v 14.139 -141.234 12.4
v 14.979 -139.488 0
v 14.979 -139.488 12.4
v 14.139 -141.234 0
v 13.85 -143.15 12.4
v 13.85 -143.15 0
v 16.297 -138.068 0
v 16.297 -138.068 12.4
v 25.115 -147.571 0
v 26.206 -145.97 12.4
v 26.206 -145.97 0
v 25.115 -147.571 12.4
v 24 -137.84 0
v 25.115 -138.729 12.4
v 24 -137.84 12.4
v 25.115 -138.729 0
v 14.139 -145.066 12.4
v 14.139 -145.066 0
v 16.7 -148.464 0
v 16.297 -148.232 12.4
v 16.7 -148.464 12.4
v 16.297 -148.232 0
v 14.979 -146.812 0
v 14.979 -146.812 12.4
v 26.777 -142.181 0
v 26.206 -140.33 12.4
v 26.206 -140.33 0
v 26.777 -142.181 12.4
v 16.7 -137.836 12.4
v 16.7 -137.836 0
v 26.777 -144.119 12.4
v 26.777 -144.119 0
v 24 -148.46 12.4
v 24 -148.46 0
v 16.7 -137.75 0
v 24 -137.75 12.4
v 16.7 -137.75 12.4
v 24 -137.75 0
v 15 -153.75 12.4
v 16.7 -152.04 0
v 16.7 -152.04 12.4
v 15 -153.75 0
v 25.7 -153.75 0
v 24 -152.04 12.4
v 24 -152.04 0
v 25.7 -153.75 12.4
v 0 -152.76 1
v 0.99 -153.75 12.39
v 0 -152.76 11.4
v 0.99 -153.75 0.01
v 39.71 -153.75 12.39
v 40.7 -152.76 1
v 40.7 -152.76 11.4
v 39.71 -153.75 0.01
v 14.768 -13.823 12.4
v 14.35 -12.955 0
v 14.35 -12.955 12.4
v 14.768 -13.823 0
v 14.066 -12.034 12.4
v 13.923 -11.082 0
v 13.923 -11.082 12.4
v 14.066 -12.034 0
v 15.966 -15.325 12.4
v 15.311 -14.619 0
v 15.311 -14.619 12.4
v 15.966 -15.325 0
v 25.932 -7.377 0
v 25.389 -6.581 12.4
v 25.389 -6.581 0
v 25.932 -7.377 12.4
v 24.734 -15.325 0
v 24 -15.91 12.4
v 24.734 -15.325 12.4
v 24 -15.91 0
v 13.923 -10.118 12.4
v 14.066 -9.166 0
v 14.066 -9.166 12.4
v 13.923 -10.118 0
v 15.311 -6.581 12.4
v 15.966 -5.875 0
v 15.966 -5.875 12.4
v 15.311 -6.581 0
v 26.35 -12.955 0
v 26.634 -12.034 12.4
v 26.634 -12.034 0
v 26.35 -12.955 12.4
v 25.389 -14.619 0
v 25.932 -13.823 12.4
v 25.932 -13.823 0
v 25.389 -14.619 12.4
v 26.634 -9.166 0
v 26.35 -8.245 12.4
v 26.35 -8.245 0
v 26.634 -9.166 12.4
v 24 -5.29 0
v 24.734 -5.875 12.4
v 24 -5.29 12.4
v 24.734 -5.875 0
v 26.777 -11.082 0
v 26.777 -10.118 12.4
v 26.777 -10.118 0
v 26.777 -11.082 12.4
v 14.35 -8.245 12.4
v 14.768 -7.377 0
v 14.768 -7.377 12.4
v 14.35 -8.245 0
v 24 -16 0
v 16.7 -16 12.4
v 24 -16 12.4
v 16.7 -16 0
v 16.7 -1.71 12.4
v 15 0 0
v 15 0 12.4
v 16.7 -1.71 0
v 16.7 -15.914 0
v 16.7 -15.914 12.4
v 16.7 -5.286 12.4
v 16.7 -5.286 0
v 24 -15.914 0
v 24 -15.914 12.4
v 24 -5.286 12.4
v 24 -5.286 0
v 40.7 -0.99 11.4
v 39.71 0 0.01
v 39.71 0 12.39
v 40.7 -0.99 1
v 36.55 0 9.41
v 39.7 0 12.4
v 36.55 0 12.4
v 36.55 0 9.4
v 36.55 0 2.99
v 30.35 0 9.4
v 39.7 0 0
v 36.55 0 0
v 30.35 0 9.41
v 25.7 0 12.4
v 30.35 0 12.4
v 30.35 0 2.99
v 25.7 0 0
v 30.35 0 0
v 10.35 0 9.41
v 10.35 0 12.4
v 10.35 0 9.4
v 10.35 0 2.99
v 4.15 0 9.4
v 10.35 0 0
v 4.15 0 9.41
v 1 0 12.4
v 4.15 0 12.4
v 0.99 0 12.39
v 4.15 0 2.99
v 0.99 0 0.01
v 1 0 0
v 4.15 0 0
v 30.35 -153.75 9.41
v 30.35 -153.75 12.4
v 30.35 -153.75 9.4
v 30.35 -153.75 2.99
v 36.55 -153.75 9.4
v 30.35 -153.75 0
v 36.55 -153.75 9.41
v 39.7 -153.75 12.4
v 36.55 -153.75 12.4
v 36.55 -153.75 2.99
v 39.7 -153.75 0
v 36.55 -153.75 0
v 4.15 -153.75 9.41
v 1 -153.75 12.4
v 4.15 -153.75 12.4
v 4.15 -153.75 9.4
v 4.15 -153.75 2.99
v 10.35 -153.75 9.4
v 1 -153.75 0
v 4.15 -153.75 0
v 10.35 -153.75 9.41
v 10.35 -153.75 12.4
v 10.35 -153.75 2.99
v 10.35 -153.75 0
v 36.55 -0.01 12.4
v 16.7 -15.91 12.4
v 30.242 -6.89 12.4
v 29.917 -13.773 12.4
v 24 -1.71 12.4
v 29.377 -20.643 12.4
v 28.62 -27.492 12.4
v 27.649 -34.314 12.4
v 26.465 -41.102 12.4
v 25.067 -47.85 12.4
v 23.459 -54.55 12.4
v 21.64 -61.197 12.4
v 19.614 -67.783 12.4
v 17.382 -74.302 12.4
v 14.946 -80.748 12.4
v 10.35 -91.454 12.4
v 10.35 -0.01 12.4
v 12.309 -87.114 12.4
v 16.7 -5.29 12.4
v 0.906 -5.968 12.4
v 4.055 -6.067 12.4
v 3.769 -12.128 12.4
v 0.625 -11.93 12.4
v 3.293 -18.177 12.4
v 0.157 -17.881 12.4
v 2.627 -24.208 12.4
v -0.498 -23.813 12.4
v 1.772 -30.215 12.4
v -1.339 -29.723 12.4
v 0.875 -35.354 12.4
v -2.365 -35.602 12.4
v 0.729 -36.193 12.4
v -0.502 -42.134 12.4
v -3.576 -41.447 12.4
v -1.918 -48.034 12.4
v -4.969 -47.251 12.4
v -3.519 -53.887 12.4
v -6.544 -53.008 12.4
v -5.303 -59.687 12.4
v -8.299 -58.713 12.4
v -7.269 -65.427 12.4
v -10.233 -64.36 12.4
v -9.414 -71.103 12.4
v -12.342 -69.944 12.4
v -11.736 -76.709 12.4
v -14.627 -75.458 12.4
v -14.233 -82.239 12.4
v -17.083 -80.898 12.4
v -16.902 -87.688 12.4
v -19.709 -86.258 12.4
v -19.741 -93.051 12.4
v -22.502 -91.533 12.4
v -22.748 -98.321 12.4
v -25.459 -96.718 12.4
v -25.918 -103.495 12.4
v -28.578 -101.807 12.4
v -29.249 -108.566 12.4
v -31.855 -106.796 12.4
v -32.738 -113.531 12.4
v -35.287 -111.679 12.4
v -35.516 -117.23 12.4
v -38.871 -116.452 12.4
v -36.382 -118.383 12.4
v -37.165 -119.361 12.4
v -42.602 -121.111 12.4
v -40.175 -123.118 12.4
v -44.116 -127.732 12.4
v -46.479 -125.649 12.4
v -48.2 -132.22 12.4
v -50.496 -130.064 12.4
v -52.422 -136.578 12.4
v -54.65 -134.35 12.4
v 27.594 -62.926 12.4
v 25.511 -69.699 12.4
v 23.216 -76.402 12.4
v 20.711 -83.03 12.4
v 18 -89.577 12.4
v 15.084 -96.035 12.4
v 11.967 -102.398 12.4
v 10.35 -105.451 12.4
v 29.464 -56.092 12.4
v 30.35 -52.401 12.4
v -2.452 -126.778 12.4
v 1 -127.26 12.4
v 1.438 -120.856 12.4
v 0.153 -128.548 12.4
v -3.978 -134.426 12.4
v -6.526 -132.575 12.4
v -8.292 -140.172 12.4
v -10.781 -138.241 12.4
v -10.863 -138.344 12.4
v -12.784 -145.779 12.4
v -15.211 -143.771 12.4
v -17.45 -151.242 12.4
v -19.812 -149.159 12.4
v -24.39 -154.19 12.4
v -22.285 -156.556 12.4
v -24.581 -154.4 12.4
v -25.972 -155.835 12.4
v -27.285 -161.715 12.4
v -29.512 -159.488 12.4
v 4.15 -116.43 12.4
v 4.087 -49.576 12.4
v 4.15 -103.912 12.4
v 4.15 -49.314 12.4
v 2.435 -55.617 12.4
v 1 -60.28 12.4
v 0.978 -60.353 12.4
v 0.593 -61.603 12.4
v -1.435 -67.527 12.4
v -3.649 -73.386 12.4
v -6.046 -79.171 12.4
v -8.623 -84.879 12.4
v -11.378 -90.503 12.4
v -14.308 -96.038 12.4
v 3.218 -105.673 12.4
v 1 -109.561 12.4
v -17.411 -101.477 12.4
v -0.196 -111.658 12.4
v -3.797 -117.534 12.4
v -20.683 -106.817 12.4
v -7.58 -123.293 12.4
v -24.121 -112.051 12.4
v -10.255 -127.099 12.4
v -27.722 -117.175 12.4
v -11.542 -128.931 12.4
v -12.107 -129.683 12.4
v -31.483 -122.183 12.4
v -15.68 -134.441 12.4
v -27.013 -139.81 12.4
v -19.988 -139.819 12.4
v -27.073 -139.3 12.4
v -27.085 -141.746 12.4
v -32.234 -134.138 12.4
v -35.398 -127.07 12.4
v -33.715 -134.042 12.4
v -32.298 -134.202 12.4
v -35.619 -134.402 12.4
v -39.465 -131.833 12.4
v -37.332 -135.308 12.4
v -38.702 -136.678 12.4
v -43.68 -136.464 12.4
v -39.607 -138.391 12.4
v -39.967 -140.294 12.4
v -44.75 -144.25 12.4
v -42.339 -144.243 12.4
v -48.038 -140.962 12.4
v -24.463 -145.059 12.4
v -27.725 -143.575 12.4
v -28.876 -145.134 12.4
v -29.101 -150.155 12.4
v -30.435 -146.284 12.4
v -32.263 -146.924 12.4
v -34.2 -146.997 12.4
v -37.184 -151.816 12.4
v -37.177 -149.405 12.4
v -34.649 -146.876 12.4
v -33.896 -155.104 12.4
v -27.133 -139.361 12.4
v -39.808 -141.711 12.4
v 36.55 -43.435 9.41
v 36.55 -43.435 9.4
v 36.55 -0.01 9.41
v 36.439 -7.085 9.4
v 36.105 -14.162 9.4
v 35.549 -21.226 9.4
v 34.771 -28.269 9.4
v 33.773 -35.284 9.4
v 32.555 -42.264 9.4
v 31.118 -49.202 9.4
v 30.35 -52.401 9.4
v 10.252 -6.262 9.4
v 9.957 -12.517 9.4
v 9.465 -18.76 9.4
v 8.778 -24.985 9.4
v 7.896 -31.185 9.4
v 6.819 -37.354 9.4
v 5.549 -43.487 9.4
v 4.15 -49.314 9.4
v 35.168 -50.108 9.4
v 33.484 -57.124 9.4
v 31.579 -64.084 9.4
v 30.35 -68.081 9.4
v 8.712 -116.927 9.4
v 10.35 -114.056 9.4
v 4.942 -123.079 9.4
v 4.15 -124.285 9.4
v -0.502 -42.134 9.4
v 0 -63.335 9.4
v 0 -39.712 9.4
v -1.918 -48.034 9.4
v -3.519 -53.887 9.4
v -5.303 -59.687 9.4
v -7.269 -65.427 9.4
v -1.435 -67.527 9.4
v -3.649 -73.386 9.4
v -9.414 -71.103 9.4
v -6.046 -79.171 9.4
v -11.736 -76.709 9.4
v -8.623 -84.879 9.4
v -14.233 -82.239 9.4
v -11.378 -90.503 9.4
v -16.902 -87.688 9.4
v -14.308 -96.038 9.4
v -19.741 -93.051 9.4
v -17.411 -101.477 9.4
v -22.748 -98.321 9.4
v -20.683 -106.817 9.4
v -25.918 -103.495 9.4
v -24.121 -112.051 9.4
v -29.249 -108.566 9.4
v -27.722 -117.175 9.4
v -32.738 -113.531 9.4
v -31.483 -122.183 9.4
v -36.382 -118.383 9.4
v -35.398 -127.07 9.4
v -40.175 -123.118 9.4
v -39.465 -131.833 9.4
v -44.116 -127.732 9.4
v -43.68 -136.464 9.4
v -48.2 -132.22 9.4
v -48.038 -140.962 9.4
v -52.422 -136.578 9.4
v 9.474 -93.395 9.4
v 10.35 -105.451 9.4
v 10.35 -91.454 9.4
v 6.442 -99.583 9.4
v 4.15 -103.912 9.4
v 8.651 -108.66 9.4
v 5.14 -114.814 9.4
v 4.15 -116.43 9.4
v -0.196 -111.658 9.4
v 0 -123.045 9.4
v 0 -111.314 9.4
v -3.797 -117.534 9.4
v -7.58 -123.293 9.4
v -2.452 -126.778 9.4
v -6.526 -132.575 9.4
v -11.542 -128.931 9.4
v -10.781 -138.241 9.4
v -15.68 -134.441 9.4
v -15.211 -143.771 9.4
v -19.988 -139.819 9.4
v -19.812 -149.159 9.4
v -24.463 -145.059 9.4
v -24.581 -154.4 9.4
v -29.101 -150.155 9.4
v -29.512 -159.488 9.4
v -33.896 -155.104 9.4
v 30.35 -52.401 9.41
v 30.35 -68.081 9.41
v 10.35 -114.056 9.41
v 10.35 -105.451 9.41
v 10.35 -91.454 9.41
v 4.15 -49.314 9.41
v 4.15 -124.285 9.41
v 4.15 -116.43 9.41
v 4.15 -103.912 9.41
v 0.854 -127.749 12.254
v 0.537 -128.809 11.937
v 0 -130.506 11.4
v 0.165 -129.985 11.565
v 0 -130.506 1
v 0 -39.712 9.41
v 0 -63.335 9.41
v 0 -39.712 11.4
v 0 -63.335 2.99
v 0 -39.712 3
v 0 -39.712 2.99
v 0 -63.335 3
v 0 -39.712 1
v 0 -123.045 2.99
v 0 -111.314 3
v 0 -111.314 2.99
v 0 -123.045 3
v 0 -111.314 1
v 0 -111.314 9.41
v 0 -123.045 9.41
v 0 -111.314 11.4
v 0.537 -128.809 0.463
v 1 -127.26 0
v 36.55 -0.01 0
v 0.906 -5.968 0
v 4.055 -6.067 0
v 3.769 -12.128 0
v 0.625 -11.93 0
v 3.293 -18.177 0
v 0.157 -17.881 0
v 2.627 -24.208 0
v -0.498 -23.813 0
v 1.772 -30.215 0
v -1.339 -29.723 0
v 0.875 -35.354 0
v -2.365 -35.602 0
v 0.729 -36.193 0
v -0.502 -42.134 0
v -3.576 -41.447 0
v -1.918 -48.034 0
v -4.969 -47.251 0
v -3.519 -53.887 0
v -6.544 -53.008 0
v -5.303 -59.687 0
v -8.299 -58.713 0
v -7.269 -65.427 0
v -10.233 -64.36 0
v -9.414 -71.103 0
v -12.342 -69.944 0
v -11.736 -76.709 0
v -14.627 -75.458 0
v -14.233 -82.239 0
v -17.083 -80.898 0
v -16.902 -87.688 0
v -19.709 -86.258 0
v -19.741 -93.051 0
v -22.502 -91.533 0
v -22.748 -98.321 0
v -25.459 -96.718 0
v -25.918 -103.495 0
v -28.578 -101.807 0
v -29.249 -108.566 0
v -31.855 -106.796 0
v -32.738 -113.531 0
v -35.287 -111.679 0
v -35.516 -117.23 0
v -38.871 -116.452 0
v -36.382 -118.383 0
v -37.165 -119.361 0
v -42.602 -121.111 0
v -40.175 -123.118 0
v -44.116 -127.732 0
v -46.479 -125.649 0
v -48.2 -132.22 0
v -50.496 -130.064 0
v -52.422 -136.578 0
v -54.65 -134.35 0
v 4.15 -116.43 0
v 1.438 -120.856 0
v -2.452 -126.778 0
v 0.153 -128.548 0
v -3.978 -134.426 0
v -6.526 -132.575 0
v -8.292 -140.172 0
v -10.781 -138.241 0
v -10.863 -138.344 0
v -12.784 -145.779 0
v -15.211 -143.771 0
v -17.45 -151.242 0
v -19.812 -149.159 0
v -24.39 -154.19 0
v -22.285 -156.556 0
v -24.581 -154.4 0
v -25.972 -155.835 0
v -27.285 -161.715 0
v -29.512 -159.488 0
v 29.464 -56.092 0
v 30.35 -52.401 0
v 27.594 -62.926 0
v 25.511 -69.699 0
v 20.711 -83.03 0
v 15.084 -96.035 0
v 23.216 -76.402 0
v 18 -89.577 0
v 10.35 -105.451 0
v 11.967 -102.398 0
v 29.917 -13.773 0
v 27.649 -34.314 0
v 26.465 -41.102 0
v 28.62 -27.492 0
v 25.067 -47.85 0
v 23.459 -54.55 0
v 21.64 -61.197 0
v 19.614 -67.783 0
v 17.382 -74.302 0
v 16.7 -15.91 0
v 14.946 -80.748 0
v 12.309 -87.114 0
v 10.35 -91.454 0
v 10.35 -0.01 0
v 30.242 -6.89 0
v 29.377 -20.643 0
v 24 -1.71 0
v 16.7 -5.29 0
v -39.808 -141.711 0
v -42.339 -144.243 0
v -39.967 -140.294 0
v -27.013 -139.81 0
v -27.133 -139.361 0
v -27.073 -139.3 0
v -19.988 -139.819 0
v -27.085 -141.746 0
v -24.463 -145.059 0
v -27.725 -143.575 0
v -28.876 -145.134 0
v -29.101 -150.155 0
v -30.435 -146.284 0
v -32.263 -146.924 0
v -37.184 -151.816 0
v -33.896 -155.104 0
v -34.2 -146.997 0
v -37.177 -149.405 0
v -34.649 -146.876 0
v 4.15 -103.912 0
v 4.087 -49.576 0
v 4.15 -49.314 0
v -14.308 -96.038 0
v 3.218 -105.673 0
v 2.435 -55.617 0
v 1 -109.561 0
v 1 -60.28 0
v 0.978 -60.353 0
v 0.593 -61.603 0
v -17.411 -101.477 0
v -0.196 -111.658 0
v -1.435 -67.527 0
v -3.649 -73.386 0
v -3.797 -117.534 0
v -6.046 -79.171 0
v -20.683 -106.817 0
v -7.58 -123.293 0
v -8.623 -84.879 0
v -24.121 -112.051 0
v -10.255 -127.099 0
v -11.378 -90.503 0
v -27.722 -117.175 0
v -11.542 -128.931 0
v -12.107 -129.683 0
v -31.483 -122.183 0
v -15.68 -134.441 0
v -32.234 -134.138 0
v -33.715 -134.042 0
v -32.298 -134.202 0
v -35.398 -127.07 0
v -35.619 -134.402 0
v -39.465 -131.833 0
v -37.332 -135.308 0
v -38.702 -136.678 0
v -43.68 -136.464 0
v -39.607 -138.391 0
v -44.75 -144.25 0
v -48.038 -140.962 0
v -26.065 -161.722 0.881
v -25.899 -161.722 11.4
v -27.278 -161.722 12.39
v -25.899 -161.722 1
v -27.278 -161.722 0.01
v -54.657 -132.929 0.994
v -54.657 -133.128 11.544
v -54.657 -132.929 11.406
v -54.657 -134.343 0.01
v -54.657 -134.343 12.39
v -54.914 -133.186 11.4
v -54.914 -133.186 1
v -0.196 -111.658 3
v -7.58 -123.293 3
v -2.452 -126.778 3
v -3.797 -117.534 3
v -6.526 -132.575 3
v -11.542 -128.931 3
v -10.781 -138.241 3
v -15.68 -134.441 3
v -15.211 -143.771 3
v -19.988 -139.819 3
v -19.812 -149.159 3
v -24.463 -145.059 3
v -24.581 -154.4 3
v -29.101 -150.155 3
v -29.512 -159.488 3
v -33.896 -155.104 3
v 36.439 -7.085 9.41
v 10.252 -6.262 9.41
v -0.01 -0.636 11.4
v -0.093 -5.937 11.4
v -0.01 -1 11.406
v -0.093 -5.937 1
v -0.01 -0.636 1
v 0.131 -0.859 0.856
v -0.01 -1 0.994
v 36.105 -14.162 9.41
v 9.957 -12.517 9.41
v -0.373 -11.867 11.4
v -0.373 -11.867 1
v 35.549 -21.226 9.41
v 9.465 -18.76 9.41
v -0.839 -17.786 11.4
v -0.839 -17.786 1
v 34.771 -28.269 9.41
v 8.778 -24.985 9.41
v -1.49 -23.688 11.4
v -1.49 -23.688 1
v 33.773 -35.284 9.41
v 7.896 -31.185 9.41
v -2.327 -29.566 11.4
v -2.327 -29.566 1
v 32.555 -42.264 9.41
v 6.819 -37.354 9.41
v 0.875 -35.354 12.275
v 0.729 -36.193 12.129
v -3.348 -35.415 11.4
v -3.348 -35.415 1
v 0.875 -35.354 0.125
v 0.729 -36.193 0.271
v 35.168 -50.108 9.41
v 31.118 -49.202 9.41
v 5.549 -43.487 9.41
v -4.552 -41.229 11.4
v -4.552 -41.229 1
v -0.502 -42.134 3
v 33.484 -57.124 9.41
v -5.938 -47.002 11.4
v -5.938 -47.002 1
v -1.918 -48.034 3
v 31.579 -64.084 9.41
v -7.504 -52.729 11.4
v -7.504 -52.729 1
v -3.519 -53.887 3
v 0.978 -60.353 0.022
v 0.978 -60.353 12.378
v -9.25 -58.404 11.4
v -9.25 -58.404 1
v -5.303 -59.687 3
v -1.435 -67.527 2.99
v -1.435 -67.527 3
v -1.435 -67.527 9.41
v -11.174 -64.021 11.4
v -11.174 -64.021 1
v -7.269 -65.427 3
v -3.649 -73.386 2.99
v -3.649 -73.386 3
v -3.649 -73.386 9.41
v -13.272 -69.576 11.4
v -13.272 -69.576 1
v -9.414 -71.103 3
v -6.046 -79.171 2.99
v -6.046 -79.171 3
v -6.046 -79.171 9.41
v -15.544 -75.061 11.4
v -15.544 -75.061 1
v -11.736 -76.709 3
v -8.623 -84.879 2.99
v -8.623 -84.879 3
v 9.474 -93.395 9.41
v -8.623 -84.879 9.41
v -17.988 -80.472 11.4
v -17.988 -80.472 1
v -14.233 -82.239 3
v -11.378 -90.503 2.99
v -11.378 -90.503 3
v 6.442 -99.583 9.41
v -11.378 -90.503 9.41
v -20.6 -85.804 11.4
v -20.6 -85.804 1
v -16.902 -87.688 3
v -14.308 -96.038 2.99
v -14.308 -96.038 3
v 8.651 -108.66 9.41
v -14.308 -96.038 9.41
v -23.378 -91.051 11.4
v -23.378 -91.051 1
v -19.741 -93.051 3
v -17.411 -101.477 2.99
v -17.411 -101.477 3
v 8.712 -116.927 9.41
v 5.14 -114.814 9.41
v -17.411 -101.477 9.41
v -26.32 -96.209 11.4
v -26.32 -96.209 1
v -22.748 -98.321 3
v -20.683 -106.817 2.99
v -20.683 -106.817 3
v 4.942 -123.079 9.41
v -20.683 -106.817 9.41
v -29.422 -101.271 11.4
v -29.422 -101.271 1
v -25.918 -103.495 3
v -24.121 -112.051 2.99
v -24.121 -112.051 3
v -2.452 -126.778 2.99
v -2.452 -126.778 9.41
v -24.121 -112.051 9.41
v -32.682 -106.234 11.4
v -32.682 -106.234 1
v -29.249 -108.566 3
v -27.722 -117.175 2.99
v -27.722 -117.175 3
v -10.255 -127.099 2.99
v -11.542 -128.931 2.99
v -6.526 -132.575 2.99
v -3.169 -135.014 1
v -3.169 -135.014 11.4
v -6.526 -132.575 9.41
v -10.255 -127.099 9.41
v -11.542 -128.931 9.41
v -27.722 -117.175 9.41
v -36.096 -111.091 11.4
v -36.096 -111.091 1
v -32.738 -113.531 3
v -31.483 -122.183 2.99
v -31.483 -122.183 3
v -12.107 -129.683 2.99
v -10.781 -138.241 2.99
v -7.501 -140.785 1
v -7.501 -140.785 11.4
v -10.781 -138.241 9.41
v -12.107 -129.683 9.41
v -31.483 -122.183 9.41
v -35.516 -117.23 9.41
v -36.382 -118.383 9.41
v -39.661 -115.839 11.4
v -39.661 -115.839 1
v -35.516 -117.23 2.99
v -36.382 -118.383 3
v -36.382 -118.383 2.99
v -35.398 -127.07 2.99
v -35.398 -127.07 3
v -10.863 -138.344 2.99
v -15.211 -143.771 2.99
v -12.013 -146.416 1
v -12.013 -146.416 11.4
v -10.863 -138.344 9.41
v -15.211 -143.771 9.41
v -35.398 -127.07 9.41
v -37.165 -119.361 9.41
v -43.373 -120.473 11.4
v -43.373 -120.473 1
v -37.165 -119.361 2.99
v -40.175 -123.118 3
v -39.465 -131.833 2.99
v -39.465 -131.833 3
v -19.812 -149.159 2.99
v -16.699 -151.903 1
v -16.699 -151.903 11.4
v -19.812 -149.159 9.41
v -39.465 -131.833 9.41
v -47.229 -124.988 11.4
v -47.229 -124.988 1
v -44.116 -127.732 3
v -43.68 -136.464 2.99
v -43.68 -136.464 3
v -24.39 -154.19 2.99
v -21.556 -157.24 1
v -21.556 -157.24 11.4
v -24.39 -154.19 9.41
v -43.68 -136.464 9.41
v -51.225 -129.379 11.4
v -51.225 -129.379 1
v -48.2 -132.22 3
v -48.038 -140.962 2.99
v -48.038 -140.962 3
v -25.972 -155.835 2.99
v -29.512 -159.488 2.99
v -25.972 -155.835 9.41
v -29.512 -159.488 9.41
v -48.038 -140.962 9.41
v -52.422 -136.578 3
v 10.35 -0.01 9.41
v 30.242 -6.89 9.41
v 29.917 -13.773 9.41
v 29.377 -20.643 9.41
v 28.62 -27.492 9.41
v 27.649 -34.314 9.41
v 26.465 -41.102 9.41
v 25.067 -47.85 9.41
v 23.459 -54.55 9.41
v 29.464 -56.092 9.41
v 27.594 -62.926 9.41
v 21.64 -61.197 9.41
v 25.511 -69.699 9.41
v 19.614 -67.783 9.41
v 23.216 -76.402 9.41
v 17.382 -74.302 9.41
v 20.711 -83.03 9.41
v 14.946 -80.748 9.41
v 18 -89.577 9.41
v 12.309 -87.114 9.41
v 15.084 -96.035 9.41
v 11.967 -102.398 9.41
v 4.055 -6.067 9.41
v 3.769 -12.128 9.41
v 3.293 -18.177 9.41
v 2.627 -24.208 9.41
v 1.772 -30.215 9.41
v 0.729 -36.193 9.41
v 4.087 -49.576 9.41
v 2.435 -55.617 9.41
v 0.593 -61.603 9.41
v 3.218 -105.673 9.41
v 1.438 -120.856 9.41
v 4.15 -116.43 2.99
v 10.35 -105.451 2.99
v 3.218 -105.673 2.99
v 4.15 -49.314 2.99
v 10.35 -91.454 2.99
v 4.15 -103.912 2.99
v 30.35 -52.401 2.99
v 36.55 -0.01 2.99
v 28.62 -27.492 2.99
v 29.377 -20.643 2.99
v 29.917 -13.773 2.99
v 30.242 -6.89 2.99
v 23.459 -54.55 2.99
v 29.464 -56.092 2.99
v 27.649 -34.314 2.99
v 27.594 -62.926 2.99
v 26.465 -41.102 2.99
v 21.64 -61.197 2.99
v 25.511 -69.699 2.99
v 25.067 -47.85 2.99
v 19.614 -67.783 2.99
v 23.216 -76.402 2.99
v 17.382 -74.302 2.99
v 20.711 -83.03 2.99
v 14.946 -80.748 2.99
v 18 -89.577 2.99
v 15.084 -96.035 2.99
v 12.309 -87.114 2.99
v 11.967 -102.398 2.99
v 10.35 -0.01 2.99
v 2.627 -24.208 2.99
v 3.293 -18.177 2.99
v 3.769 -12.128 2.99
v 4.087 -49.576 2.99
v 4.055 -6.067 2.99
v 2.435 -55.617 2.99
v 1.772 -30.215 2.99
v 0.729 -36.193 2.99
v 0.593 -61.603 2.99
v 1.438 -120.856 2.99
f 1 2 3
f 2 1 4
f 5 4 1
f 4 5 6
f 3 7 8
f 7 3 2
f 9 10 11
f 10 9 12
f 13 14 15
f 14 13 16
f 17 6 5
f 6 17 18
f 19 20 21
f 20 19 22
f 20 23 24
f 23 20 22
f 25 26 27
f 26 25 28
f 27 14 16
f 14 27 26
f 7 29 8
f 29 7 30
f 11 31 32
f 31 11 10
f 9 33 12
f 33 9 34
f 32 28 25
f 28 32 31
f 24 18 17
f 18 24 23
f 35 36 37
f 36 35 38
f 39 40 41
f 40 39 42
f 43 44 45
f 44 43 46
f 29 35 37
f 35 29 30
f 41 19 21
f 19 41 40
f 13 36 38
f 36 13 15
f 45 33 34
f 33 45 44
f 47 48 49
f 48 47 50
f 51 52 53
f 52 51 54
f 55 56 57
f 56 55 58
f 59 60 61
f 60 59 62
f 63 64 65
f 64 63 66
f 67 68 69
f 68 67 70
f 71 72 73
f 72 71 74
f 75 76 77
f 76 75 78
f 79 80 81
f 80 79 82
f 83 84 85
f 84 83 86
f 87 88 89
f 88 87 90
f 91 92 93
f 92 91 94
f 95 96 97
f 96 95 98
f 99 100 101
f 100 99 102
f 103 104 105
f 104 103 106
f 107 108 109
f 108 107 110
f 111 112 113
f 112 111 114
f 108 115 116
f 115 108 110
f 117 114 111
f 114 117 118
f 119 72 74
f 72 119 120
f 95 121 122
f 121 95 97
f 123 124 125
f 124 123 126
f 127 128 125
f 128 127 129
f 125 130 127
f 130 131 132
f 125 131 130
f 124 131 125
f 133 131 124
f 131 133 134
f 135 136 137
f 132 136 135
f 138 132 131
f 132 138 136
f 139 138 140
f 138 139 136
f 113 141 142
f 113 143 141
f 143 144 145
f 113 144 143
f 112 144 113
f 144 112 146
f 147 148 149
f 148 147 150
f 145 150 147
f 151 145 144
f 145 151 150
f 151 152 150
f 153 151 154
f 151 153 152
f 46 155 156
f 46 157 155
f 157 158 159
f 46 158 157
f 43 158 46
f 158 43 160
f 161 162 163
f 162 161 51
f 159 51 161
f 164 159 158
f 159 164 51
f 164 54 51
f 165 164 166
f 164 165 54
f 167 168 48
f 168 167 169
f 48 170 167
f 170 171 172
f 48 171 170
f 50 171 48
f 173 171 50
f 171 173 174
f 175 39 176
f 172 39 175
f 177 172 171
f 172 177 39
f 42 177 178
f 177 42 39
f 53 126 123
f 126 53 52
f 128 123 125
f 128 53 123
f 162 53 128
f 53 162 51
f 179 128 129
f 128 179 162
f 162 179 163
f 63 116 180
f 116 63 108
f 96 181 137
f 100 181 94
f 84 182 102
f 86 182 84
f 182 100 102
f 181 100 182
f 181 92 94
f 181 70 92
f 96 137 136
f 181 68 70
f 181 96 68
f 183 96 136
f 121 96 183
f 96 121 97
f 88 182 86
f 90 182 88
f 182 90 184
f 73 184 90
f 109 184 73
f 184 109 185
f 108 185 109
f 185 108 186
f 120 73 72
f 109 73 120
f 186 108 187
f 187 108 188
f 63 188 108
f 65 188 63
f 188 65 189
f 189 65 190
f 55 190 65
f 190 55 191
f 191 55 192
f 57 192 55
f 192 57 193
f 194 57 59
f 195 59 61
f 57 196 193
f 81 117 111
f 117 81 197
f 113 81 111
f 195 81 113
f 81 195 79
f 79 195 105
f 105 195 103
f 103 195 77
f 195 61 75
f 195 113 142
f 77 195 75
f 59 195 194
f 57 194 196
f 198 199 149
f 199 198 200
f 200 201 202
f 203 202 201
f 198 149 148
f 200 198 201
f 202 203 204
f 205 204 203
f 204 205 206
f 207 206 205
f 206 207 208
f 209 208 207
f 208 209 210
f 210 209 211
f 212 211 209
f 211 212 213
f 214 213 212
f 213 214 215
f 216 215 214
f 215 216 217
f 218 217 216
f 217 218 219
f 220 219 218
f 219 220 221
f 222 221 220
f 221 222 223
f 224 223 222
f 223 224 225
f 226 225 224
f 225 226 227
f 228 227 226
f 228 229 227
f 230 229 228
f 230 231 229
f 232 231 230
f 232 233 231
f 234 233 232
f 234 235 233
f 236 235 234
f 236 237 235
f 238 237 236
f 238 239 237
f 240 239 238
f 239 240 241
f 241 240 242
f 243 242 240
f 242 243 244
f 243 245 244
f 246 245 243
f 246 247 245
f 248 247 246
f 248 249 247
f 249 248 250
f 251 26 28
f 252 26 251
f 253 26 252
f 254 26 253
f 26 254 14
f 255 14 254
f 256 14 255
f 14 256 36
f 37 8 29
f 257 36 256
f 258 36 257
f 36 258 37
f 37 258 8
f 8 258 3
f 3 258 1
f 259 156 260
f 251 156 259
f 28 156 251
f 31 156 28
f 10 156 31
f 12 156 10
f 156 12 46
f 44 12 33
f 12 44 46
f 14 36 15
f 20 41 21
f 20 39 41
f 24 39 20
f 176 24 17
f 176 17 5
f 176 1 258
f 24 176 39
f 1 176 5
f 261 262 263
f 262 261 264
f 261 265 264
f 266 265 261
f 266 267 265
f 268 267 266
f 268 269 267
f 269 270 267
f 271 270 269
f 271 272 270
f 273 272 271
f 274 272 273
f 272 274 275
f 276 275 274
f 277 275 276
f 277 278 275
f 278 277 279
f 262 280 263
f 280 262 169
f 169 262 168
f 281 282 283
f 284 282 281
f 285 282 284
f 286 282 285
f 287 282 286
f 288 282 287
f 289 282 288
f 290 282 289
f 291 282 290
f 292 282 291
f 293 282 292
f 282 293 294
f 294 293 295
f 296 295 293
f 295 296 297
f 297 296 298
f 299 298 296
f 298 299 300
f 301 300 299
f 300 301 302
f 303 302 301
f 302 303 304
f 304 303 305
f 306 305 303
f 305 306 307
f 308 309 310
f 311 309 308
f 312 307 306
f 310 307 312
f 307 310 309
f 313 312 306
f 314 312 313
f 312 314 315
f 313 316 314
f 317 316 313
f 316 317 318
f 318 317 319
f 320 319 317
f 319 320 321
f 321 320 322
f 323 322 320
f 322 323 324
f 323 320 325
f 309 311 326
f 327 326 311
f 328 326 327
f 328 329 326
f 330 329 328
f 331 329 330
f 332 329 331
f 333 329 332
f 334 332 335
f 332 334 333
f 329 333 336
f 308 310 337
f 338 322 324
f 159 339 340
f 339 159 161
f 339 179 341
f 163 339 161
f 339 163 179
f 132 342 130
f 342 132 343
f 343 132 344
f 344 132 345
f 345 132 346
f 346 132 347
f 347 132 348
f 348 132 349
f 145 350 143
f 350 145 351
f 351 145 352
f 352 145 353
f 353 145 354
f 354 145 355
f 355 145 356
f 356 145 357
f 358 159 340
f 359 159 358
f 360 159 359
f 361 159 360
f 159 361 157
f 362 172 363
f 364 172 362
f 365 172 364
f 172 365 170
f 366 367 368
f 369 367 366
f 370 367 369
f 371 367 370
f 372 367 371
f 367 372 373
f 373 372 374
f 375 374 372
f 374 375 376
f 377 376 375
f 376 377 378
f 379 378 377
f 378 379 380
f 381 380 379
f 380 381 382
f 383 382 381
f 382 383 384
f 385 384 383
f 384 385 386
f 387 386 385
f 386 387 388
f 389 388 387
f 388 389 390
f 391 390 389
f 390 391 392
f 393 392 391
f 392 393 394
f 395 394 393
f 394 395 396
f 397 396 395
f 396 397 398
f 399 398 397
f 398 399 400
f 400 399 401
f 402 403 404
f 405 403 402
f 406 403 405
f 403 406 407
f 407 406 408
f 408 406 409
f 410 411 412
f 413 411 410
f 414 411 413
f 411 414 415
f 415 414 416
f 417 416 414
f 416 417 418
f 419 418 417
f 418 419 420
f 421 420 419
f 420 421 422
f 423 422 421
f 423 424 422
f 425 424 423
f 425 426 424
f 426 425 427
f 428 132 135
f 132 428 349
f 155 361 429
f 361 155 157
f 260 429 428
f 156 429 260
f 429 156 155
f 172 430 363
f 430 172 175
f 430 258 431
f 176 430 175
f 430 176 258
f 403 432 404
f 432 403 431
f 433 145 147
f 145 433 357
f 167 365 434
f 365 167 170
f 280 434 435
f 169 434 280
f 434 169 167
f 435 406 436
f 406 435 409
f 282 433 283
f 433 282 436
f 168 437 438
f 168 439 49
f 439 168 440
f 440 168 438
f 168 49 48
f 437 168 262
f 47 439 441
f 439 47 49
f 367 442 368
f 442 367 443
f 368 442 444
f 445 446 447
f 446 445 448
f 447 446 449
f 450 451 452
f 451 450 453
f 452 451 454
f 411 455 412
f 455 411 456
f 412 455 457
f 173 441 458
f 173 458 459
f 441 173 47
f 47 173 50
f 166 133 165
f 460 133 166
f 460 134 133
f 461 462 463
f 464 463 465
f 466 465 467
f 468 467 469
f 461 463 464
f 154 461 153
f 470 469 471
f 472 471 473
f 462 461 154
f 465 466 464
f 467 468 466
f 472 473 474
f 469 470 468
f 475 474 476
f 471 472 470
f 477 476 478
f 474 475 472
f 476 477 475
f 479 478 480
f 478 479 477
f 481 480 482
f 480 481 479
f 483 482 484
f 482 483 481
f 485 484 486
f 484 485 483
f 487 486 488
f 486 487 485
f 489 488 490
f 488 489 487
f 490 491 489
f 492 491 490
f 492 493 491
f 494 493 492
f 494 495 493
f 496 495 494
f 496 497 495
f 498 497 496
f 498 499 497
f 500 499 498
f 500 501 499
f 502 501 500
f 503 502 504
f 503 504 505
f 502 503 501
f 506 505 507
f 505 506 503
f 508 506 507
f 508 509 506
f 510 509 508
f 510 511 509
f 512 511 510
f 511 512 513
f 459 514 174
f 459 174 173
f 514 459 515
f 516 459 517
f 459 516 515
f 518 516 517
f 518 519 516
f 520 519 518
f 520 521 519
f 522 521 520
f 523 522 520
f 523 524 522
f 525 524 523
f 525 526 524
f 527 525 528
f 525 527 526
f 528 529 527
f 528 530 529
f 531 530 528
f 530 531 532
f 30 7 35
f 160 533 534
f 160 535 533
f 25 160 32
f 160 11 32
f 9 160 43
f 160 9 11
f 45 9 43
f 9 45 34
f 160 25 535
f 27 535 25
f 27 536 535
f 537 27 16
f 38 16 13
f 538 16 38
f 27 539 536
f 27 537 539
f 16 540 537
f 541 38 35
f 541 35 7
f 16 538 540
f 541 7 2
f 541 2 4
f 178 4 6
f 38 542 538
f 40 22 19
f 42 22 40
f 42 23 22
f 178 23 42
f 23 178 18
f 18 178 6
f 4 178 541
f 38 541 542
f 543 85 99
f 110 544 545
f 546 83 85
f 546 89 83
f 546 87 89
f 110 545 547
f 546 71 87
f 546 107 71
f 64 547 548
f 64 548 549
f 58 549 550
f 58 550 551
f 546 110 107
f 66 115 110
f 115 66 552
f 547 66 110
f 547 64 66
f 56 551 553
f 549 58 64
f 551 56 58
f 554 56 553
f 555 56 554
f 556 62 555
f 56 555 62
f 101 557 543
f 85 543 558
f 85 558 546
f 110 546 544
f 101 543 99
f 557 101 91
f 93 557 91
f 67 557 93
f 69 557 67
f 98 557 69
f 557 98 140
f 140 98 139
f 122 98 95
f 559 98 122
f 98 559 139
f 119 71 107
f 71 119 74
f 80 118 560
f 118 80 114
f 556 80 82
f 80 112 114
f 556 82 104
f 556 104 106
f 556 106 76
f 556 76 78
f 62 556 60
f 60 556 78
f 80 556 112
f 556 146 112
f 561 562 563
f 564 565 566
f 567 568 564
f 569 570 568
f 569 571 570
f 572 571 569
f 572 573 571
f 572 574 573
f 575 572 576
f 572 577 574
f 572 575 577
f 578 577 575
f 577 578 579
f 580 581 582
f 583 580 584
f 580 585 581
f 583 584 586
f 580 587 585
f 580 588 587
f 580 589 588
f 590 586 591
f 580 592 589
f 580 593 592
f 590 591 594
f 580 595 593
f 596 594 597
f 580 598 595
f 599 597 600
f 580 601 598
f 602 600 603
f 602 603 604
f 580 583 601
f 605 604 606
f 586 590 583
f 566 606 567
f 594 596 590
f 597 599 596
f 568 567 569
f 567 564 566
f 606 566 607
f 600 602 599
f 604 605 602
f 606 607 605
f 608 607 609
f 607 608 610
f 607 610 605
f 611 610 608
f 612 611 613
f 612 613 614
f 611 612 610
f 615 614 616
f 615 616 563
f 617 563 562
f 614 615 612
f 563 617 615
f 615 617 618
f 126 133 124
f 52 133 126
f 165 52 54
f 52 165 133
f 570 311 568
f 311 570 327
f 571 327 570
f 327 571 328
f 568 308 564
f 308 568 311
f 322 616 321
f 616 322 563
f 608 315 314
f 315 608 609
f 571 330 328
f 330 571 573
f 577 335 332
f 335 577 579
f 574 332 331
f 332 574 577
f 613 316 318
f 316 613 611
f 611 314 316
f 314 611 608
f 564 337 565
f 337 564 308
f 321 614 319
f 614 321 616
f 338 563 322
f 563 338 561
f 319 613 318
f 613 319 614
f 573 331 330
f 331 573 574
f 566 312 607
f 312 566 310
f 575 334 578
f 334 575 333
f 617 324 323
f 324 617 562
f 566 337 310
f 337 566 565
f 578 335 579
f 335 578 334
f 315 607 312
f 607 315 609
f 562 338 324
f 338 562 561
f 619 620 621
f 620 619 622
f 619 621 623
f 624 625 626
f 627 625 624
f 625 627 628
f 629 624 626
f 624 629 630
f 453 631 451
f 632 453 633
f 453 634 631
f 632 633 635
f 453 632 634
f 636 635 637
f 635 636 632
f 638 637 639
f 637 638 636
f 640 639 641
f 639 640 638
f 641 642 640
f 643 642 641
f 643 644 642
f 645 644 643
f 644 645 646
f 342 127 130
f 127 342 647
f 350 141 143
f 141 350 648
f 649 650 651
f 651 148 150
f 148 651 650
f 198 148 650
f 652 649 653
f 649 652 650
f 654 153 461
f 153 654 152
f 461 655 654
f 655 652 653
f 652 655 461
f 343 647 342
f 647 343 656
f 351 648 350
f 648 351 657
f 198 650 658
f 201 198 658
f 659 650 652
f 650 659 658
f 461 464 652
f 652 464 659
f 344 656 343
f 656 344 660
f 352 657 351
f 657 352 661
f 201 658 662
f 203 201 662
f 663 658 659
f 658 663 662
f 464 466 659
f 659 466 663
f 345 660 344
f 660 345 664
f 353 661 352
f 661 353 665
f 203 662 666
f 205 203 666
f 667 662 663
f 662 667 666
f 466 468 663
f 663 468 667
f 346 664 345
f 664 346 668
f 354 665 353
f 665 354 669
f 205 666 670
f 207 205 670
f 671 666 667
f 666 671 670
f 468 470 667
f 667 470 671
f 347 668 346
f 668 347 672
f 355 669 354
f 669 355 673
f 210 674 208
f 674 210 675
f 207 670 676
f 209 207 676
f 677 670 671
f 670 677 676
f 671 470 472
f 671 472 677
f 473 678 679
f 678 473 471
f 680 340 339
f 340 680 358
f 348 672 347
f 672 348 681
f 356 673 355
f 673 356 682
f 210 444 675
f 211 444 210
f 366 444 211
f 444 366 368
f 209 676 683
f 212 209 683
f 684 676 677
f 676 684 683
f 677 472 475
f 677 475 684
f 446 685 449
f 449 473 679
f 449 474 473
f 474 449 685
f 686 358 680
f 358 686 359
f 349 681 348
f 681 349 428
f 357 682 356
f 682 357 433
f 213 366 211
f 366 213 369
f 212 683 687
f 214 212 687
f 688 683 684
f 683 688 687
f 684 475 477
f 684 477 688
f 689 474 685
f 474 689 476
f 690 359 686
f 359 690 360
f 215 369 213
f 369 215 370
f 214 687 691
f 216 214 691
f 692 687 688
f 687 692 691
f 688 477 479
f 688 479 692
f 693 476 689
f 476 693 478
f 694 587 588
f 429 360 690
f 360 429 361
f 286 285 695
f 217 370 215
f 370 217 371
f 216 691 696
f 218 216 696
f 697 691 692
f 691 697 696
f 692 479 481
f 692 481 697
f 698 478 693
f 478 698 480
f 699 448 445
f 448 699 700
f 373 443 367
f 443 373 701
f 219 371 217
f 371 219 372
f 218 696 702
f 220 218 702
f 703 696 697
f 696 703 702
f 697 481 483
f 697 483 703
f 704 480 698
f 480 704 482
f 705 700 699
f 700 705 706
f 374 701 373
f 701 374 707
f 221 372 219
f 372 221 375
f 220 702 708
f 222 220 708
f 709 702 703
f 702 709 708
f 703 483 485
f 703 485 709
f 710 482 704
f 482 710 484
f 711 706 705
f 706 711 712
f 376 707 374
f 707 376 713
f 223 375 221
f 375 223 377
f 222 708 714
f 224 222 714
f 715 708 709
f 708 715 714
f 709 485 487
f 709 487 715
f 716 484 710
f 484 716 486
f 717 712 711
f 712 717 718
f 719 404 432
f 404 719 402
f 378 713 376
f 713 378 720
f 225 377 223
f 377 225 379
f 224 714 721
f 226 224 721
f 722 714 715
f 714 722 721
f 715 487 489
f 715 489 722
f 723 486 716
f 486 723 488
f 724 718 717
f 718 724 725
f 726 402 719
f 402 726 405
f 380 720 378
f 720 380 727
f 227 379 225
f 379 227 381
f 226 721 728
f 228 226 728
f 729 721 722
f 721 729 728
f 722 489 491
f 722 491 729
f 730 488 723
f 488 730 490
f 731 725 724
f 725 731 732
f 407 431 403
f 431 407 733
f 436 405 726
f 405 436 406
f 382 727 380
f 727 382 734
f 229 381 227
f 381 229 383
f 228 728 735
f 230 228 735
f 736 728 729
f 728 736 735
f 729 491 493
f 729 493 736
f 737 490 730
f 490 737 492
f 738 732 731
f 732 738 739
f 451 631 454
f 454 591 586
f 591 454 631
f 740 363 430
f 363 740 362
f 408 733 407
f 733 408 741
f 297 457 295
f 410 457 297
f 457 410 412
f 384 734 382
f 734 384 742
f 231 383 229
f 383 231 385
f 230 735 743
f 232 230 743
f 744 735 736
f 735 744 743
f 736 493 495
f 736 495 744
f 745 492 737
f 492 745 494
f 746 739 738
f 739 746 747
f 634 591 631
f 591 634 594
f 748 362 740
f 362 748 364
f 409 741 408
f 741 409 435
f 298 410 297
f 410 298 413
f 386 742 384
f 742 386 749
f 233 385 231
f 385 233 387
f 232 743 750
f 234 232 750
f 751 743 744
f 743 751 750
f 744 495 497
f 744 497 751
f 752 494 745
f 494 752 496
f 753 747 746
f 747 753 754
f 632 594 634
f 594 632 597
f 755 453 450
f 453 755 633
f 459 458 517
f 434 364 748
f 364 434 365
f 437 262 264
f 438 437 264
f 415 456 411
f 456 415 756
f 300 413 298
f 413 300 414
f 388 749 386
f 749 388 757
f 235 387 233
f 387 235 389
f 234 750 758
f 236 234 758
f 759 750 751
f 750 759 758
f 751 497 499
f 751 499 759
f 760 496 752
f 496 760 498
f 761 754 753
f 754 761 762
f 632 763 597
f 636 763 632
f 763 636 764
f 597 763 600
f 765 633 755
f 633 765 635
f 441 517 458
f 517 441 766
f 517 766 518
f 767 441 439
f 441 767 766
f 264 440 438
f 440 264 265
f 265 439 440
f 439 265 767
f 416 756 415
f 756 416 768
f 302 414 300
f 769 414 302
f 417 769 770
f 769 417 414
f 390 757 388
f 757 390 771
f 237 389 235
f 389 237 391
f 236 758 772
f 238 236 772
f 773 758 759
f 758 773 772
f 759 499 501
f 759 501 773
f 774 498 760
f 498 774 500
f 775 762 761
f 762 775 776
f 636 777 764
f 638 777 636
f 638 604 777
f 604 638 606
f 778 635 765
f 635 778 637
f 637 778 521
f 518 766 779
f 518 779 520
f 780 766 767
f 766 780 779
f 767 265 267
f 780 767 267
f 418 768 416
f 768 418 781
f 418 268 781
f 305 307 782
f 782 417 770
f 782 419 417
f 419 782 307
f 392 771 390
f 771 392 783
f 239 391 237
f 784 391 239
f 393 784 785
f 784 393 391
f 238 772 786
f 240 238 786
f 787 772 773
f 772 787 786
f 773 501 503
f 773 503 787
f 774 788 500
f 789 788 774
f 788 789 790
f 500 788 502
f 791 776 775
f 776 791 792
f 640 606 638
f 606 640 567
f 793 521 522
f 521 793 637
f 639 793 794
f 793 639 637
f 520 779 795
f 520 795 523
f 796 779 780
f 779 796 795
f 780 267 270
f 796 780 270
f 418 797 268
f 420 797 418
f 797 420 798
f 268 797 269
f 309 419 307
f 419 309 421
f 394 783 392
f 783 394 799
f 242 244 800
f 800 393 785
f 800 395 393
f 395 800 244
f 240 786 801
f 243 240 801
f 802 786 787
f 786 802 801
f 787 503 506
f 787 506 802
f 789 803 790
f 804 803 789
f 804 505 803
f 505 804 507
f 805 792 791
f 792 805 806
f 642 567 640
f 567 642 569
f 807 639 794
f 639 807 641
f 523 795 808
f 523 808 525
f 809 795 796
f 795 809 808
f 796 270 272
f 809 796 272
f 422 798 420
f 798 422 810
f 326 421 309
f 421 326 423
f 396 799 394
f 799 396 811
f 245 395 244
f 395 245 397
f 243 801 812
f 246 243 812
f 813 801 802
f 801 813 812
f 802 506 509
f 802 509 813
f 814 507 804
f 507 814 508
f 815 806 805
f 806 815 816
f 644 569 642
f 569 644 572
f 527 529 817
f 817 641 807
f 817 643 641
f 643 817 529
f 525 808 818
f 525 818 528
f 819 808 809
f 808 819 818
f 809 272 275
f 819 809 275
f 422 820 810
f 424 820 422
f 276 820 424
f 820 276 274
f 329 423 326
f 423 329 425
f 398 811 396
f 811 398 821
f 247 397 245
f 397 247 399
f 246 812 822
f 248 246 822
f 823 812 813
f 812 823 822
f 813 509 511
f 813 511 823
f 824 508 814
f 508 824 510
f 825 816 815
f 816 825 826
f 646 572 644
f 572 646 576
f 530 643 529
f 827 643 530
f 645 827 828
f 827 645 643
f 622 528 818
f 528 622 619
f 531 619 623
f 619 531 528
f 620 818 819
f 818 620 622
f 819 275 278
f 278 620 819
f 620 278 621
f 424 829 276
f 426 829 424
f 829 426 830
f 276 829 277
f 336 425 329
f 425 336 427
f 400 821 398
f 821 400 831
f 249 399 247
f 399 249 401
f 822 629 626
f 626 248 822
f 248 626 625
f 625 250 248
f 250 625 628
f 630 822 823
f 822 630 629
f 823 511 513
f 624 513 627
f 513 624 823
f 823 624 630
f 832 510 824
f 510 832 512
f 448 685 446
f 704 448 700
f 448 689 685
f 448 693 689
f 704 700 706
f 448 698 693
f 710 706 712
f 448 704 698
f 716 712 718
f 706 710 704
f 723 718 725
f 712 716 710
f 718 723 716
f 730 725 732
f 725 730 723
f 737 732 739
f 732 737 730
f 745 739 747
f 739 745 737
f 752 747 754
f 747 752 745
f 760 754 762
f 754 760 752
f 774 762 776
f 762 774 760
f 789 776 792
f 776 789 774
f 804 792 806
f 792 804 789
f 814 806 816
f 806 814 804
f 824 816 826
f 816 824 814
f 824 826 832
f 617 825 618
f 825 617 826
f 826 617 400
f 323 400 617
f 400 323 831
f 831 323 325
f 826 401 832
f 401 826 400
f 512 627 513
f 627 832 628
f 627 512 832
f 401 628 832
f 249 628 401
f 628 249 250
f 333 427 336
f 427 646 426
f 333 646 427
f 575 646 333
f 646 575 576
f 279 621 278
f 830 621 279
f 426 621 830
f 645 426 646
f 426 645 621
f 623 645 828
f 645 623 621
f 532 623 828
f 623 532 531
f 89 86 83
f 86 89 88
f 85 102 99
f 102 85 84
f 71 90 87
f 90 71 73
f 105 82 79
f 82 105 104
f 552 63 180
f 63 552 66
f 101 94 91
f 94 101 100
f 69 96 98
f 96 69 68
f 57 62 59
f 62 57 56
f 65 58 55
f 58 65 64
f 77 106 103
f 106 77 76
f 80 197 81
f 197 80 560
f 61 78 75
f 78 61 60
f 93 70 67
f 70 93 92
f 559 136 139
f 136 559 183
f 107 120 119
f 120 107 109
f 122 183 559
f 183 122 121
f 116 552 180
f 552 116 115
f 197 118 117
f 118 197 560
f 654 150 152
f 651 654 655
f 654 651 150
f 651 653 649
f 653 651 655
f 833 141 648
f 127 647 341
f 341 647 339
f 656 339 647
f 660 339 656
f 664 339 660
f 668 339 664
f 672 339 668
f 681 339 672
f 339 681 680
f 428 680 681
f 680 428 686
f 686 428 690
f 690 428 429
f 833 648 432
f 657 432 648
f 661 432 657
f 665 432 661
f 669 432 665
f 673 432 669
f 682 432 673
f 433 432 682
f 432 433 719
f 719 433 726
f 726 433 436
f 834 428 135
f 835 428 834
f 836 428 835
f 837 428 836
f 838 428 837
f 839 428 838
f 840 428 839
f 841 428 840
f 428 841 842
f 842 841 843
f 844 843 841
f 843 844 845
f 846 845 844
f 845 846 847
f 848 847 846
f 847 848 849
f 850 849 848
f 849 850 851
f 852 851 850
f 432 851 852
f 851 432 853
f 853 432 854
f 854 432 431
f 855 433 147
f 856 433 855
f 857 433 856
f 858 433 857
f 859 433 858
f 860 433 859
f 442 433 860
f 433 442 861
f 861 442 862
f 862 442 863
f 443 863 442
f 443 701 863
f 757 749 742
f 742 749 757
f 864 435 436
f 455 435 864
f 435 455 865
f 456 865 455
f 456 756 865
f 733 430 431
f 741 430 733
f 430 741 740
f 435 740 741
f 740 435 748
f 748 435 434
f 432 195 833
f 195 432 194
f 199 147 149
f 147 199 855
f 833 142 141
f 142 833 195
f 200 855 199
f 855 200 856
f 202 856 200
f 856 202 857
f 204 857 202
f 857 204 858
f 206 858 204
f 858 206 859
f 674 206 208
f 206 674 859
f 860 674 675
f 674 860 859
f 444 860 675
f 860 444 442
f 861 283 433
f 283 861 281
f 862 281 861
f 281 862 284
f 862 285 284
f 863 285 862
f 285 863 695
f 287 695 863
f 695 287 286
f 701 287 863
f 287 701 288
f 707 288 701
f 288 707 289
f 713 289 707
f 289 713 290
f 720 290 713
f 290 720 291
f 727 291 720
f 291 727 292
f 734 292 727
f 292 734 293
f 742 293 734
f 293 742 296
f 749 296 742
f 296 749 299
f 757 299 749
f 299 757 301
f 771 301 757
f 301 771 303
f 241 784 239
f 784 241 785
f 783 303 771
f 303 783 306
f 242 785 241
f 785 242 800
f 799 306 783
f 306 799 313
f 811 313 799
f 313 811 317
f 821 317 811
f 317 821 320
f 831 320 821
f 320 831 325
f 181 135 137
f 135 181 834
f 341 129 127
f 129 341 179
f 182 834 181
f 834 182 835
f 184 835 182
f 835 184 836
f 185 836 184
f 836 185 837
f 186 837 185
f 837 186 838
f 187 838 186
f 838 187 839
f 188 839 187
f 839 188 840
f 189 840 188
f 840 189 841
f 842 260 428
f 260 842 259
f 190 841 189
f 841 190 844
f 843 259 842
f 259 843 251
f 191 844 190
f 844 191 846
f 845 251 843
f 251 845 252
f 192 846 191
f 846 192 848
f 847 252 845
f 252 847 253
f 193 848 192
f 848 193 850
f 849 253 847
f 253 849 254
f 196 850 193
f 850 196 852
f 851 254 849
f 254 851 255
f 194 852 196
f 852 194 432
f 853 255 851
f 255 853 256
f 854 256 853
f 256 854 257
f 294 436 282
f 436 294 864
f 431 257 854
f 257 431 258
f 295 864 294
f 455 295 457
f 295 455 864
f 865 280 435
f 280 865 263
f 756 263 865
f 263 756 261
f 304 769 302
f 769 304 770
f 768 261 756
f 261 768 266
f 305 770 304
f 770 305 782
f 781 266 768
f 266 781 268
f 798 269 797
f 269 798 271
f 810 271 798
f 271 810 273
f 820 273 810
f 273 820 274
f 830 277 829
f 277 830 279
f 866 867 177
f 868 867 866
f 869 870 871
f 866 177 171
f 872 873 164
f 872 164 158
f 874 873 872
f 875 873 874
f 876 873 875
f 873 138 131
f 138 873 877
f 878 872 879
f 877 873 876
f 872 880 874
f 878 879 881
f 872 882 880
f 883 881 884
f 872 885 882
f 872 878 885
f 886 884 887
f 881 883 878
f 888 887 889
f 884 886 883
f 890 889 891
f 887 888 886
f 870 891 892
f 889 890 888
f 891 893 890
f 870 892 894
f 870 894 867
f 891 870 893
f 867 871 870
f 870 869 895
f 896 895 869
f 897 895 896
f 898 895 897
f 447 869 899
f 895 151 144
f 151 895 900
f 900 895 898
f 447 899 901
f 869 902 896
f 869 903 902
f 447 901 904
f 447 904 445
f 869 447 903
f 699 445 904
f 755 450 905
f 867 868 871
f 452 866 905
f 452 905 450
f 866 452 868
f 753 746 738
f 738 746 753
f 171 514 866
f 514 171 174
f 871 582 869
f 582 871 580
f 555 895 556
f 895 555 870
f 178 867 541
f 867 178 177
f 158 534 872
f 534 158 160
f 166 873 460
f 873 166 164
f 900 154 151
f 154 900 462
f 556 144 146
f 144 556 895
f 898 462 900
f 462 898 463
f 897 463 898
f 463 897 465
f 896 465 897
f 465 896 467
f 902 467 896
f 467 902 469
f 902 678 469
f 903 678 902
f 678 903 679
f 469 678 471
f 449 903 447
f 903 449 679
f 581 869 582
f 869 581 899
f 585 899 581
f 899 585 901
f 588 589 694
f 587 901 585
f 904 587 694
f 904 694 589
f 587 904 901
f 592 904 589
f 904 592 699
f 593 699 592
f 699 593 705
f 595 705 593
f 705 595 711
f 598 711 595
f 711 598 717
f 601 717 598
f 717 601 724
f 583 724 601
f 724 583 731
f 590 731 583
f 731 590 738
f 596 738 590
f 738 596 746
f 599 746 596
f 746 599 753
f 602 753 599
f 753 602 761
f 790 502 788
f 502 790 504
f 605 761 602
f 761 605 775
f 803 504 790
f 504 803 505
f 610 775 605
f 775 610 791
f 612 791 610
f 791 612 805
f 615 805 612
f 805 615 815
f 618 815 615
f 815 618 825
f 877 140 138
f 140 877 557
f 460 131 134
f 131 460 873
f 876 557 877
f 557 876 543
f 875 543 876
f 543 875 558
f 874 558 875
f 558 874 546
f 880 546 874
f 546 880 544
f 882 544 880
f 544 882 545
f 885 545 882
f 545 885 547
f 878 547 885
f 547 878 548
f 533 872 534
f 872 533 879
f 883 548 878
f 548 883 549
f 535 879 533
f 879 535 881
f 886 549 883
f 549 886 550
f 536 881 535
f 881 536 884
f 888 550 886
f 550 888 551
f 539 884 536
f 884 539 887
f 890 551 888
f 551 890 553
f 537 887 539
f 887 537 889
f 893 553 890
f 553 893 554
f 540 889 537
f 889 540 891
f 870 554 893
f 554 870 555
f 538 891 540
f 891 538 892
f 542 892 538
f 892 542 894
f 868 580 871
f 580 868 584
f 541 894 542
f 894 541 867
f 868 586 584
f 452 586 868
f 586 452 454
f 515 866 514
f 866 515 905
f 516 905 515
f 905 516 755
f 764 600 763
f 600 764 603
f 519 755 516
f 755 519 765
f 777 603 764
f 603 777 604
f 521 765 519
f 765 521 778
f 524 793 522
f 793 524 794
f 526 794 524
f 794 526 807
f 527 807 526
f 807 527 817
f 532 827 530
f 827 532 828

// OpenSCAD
include <lib/brio.scad>

//brio_straight(LENGTH);
//brio_straight((3/4)*LENGTH);
//brio_straight((1/2)*LENGTH);
//brio_straight((1/4)*LENGTH);
//brio_curved(ROUND_R, 8); // inner radius, Nth part
//brio_curved(ROUND_R, 16); // inner radius, Nth part
//brio_bridge();
//brio_cross(LENGTH/2);
brio_splitter();
//brio_splitter_round();
//brio_support();
//brio_tunnel();
//brio_connector(CONN_LEN);
